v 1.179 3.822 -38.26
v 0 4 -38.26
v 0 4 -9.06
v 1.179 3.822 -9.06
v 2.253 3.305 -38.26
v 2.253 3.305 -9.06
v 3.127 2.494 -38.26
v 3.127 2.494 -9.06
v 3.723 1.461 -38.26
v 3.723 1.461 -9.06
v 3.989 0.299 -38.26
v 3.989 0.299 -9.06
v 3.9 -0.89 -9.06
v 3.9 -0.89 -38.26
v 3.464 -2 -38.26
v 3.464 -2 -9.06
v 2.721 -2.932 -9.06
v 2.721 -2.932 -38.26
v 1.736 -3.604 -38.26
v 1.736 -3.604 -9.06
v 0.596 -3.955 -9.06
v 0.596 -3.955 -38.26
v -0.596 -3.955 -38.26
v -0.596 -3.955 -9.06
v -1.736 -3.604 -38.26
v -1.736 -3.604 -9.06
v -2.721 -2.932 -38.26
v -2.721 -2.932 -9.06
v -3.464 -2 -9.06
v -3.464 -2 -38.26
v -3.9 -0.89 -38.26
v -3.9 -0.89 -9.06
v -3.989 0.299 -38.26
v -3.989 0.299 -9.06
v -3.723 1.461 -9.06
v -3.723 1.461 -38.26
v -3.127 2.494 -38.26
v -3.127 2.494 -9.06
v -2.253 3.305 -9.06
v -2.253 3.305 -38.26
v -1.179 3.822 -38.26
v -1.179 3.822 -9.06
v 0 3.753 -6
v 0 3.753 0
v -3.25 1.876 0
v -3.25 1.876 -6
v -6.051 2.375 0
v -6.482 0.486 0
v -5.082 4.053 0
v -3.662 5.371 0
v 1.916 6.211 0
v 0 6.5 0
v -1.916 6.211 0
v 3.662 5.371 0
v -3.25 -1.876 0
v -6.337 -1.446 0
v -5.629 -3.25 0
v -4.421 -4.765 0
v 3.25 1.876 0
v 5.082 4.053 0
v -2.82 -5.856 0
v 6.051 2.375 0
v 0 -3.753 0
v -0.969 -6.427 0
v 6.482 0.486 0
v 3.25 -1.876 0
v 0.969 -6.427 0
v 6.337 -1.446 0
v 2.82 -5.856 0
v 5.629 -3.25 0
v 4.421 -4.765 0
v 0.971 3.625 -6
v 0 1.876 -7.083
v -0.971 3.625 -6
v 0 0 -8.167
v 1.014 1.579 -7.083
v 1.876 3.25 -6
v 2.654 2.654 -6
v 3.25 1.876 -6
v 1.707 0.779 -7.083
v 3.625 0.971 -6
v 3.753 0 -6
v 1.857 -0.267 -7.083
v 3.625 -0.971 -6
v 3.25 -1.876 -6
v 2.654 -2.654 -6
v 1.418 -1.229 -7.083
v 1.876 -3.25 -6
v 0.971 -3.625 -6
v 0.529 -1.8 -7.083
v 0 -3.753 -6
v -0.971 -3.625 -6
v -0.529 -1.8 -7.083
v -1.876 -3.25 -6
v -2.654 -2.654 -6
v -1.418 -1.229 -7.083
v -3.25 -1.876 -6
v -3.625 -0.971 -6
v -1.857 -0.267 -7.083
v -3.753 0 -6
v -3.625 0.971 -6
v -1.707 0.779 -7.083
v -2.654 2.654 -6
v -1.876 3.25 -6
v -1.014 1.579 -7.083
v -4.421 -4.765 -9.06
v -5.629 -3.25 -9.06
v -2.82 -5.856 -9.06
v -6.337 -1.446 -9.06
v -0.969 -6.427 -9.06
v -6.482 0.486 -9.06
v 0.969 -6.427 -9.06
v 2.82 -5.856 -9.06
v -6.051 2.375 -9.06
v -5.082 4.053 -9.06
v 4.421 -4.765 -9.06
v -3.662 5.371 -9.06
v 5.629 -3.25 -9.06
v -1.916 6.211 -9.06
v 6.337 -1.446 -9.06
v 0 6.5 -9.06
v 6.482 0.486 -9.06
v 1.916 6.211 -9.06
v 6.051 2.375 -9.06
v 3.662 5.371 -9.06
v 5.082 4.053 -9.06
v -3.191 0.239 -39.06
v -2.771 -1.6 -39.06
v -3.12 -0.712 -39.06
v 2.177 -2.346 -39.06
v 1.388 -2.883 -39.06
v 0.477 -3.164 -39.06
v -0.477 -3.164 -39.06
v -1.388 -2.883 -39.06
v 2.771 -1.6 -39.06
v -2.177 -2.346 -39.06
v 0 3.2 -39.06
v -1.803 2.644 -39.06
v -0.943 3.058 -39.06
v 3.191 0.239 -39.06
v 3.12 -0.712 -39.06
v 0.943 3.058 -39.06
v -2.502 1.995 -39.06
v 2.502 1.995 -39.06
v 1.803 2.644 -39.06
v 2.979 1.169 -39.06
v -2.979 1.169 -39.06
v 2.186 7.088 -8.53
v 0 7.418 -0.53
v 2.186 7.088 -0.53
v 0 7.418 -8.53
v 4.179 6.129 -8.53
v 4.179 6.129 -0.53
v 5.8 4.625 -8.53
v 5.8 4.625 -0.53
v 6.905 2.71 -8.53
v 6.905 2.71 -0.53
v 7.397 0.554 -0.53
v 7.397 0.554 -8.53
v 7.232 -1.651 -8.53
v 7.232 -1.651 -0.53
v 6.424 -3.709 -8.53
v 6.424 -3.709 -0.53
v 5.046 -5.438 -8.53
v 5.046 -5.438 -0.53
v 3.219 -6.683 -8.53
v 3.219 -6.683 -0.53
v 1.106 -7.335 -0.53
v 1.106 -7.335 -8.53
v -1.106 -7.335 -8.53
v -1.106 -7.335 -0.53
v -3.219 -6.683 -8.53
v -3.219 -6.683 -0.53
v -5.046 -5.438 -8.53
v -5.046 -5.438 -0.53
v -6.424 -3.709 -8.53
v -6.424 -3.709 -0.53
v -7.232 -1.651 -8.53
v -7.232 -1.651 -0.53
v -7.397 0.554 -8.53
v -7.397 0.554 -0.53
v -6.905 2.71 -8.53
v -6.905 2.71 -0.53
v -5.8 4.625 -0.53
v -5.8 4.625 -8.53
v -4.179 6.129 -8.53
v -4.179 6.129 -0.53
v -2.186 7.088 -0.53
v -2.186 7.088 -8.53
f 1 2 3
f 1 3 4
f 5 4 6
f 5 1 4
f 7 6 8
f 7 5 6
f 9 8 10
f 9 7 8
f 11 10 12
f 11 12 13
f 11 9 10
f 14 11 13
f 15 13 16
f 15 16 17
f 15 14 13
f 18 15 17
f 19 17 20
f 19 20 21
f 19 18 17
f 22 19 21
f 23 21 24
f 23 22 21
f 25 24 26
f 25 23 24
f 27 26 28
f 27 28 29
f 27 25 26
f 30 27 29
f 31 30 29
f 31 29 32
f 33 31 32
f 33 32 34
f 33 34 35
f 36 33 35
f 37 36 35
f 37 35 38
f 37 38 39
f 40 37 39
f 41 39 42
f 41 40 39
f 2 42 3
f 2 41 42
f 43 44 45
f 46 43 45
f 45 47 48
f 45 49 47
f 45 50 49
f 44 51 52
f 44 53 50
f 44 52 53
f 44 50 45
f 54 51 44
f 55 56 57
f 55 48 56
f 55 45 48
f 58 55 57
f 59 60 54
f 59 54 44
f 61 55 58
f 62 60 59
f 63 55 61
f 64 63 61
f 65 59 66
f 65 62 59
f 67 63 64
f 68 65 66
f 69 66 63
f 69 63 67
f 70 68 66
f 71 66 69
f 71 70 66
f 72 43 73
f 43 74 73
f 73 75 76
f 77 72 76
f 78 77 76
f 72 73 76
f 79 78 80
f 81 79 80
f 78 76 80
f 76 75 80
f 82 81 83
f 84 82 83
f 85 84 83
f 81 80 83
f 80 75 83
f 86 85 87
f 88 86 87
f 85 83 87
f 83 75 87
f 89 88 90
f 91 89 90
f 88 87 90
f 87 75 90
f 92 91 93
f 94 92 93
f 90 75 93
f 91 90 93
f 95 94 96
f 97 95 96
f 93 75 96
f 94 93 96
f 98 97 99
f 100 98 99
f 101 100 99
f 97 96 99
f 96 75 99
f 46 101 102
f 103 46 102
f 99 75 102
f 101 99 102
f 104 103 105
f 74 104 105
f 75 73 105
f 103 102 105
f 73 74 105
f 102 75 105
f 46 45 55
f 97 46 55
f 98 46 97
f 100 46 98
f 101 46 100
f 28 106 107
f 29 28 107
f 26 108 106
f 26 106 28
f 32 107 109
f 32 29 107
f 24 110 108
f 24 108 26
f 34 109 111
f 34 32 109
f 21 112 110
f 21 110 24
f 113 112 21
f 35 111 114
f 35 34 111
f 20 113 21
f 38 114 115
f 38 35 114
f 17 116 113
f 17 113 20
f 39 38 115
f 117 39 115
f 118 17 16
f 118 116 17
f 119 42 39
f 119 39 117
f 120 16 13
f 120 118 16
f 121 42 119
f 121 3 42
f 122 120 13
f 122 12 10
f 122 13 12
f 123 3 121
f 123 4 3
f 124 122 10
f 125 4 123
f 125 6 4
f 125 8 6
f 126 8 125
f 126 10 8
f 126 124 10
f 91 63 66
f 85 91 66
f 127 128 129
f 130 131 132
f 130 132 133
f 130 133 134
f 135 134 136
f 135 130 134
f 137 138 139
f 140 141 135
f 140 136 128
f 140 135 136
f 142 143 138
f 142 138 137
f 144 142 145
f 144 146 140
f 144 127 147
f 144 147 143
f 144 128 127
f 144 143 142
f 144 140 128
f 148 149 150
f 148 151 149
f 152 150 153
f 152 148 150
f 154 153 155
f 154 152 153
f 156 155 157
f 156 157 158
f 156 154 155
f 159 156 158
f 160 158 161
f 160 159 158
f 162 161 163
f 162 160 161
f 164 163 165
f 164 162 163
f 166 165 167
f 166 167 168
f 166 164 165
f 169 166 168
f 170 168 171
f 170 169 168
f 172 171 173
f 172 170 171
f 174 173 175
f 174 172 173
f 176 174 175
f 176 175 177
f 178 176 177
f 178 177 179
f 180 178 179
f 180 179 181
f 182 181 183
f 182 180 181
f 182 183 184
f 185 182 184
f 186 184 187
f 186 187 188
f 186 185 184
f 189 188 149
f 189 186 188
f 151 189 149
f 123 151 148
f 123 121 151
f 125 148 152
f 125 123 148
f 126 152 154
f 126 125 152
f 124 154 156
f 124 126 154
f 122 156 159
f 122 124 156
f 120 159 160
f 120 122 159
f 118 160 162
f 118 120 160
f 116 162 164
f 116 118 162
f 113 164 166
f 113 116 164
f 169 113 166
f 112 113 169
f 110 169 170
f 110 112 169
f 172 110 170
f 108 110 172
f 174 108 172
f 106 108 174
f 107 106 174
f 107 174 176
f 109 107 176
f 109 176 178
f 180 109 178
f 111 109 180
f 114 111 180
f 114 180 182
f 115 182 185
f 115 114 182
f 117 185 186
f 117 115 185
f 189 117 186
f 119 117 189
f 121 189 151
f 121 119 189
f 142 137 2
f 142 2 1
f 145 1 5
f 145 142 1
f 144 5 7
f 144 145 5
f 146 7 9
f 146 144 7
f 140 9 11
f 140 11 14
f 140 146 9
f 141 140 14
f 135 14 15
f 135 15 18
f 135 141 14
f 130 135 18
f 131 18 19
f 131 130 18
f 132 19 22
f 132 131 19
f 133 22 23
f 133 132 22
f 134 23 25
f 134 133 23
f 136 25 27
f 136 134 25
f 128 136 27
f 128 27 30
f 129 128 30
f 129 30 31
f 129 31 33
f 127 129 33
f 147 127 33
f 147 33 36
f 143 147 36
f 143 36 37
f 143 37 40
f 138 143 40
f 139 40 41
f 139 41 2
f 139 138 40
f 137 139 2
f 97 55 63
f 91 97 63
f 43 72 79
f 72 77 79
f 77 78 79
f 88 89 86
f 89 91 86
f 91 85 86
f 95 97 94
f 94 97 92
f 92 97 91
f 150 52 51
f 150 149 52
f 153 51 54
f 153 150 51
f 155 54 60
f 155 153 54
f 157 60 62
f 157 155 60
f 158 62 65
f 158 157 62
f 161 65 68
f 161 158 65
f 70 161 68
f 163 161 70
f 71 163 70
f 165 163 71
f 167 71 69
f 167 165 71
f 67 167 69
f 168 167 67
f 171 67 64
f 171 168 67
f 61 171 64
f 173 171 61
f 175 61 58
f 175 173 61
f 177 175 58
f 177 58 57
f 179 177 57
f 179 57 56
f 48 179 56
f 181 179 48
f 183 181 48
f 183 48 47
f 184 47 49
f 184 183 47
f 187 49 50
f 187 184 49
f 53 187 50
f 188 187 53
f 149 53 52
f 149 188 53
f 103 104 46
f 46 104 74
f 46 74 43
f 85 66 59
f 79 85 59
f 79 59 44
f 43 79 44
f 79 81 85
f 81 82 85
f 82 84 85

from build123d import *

# Parameters (mm, degrees)
CHAMFER1_SIZE      = 0.8
CUT_EXTRUDE1_DEPTH = 6


with BuildPart() as part:
    # Sketch1 → Revolve1 (revolve)
    with BuildSketch(Plane(origin=(0, 0, 0), x_dir=(0, 0, -1), z_dir=(1, 0, 0))):
        Polygon((0, 0), (0, 6.5), (0.53, 7.417986928), (8.53, 7.417986928), (9.06, 6.5), (9.06, 4), (39.06, 4), (39.06, 0), align=None)
    revolve(axis=Axis((0, 0, 0), (0, 0, -1)))

    # Chamfer1
    chamfer1_edges = [part.edges().sort_by_distance(p)[0] for p in [
        (0, -4, -39.06),
    ]]
    chamfer(chamfer1_edges, length=CHAMFER1_SIZE)

    # Sketch2 → Cut-Extrude1 (cut)
    with BuildSketch(Plane.XY):
        Polygon((-3.25, 1.876388375), (-3.25, -1.876388375), (0, -3.75277675), (3.25, -1.876388375), (3.25, 1.876388375), (0, 3.75277675), align=None)
    extrude(amount=-CUT_EXTRUDE1_DEPTH, mode=Mode.SUBTRACT)

    # Sketch3 → Cut-Revolve2 (revolve, cut)
    with BuildSketch(Plane(origin=(0, 0, 0), x_dir=(0, 0, -1), z_dir=(1, 0, 0))):
        Polygon((6, 0), (6, 3.75277675), (8.166666667, 0), align=None)
    revolve(axis=Axis((0, 0, 0), (0, 0, -1)), mode=Mode.SUBTRACT)


solid = part.part
